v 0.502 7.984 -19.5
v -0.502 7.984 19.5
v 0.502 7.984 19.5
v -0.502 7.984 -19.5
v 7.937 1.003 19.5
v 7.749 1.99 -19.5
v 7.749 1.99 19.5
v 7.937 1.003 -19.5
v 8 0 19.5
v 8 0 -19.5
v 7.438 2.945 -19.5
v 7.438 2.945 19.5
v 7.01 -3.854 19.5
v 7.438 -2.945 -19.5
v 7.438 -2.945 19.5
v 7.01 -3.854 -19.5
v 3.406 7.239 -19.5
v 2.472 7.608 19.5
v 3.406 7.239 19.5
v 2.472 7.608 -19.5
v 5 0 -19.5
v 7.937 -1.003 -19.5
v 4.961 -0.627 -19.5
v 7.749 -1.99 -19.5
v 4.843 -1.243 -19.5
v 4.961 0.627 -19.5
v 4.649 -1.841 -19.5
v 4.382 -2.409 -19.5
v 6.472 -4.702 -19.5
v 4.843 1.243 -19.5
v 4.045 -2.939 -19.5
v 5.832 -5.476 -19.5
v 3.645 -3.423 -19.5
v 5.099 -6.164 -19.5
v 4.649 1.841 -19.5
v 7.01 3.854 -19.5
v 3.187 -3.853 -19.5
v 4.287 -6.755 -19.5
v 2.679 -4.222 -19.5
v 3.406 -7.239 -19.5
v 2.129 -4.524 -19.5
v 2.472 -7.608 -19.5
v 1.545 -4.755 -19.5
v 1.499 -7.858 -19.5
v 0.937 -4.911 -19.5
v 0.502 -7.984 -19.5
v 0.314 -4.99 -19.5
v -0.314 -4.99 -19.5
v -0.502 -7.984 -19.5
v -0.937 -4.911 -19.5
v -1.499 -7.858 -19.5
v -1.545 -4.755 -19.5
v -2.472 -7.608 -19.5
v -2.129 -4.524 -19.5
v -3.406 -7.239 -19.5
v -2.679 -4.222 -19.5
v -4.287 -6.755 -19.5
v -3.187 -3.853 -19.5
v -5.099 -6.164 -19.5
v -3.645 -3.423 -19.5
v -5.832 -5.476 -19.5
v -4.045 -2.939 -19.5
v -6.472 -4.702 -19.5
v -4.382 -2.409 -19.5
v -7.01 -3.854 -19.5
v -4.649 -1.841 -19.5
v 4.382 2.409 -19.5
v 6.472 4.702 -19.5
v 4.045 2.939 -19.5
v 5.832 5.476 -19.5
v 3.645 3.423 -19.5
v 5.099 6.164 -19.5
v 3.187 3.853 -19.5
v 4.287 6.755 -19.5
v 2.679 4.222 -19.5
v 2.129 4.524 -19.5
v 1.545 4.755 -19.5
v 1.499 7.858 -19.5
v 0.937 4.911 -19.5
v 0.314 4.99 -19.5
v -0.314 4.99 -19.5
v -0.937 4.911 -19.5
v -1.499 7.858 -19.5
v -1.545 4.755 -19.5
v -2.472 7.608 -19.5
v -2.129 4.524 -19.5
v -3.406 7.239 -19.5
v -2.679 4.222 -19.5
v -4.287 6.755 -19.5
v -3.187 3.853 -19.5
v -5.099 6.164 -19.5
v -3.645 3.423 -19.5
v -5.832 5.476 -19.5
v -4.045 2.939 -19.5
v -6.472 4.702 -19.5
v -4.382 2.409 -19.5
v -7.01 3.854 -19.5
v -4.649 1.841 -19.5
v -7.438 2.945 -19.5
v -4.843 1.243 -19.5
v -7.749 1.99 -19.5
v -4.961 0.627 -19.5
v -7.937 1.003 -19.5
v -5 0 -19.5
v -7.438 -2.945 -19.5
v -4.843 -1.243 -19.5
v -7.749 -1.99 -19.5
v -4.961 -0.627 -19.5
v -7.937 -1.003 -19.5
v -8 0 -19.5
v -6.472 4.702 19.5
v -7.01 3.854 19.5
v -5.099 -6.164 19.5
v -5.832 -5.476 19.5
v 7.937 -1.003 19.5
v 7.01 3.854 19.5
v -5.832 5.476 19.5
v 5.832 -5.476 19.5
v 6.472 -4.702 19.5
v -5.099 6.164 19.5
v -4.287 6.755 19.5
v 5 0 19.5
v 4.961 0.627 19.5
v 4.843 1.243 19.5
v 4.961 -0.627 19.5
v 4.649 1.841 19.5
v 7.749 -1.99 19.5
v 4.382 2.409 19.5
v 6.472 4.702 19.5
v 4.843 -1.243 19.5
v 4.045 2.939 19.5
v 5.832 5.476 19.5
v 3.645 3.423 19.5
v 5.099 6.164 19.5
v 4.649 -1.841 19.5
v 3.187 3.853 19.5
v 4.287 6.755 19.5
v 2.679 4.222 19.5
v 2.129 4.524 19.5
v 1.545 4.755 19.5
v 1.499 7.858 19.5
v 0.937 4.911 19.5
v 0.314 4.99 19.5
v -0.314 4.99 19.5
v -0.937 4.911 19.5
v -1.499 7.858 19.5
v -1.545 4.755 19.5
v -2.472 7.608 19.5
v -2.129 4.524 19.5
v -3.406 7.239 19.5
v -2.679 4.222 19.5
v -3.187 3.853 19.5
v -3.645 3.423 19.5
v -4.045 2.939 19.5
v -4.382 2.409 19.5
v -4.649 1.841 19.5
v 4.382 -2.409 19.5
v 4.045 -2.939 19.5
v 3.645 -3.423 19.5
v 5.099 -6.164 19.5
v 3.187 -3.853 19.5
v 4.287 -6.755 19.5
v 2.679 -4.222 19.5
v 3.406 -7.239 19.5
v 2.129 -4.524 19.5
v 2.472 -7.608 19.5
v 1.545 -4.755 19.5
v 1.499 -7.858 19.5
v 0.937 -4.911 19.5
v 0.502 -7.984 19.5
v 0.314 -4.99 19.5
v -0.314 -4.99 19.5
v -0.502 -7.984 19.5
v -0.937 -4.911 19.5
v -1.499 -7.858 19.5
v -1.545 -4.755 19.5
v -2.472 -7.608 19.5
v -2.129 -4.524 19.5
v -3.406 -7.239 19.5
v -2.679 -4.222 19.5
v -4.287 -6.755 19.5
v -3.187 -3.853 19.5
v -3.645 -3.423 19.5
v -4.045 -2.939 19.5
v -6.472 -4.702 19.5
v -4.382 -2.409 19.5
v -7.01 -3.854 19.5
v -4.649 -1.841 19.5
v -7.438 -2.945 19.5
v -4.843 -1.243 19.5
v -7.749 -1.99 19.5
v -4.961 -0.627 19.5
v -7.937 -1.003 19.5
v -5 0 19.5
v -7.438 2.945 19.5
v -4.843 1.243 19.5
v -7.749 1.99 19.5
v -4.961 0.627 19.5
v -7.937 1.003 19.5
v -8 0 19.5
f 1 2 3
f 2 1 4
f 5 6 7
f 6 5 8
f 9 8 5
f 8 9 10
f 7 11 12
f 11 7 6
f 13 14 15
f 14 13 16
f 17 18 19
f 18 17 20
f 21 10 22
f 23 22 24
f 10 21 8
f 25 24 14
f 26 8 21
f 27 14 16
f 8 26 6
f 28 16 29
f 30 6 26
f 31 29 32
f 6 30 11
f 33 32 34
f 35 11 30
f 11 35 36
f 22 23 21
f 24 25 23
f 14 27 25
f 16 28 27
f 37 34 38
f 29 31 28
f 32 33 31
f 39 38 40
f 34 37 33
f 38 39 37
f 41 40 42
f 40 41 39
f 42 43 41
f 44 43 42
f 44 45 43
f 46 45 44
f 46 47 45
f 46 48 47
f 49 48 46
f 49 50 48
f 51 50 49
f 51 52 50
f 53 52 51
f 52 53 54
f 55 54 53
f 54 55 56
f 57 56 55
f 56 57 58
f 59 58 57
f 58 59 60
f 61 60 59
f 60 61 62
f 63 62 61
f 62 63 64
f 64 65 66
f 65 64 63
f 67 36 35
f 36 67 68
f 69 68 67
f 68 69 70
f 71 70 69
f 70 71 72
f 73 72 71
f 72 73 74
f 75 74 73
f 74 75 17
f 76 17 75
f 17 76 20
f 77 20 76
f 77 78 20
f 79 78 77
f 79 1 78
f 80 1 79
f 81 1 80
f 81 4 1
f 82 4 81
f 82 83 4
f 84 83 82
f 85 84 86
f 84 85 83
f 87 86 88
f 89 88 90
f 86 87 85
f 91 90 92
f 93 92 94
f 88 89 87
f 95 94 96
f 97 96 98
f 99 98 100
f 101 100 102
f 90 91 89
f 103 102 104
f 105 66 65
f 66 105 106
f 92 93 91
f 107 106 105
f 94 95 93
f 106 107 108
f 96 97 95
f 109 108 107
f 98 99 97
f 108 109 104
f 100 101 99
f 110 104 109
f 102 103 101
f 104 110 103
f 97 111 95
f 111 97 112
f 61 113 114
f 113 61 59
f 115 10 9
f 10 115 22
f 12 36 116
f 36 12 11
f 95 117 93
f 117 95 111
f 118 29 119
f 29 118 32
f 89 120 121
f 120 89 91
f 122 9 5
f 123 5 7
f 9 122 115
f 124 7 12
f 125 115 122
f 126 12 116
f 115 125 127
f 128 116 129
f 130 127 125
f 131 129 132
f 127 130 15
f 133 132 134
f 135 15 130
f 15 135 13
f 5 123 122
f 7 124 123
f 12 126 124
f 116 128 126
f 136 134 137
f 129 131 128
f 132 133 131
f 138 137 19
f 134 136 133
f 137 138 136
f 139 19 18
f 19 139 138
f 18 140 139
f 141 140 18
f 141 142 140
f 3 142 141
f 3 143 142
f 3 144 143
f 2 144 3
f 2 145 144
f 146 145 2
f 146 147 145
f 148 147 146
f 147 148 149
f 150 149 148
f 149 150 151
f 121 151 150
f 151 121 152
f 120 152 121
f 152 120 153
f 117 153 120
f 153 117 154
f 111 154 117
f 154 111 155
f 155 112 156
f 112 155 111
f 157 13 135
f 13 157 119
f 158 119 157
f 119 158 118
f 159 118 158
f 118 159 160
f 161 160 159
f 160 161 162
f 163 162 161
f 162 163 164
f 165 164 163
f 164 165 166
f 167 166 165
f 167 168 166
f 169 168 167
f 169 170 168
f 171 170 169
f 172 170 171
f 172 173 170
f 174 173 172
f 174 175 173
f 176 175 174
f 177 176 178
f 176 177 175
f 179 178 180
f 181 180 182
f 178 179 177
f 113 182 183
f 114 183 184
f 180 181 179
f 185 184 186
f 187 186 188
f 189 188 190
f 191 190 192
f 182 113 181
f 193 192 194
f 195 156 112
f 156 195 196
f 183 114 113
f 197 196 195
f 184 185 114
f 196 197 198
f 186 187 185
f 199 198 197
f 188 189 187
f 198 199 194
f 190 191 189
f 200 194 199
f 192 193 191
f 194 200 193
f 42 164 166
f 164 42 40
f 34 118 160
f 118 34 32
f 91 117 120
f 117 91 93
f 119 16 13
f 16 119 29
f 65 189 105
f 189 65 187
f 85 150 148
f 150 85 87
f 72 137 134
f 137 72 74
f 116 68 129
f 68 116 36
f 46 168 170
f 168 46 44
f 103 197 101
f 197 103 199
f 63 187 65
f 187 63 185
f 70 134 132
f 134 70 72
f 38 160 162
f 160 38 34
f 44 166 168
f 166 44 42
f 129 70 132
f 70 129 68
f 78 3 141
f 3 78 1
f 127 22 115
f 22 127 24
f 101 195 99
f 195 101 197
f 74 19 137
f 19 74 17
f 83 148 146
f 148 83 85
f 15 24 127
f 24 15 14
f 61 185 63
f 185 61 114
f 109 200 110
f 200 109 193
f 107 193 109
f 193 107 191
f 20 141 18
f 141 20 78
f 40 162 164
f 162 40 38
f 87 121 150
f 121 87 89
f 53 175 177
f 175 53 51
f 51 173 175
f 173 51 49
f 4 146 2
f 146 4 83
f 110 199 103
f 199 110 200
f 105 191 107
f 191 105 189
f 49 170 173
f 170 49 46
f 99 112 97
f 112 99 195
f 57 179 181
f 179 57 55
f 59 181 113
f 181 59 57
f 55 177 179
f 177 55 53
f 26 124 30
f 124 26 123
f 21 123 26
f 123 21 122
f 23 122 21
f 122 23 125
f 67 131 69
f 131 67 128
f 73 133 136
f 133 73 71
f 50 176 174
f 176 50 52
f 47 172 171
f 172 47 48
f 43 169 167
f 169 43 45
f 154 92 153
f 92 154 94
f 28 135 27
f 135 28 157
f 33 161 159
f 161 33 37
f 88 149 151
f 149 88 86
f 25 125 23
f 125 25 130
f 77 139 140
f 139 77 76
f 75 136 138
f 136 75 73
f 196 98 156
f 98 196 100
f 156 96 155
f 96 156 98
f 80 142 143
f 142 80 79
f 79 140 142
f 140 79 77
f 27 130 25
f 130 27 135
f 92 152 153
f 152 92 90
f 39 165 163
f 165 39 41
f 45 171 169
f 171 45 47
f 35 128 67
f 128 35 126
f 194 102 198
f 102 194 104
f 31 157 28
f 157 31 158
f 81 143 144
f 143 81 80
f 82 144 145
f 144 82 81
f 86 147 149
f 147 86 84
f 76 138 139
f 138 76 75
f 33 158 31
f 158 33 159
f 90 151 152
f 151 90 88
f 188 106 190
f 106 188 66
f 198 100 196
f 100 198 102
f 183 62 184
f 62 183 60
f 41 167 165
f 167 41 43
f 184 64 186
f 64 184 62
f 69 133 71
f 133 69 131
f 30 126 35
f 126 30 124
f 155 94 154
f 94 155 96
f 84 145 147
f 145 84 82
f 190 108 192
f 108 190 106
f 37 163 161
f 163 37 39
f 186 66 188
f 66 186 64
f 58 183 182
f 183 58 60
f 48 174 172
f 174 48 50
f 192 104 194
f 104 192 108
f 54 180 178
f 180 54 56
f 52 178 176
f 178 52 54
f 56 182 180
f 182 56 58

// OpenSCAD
$fn = 50;


difference() {
	union() {
		translate(v = [0, 0, -19.5000000000]) {
			cylinder(h = 39, r = 8.0000000000);
		}
	}
	union() {
		translate(v = [0, 0, -100.0000000000]) {
			cylinder(h = 200, r = 5.0000000000);
		}
	}
}
